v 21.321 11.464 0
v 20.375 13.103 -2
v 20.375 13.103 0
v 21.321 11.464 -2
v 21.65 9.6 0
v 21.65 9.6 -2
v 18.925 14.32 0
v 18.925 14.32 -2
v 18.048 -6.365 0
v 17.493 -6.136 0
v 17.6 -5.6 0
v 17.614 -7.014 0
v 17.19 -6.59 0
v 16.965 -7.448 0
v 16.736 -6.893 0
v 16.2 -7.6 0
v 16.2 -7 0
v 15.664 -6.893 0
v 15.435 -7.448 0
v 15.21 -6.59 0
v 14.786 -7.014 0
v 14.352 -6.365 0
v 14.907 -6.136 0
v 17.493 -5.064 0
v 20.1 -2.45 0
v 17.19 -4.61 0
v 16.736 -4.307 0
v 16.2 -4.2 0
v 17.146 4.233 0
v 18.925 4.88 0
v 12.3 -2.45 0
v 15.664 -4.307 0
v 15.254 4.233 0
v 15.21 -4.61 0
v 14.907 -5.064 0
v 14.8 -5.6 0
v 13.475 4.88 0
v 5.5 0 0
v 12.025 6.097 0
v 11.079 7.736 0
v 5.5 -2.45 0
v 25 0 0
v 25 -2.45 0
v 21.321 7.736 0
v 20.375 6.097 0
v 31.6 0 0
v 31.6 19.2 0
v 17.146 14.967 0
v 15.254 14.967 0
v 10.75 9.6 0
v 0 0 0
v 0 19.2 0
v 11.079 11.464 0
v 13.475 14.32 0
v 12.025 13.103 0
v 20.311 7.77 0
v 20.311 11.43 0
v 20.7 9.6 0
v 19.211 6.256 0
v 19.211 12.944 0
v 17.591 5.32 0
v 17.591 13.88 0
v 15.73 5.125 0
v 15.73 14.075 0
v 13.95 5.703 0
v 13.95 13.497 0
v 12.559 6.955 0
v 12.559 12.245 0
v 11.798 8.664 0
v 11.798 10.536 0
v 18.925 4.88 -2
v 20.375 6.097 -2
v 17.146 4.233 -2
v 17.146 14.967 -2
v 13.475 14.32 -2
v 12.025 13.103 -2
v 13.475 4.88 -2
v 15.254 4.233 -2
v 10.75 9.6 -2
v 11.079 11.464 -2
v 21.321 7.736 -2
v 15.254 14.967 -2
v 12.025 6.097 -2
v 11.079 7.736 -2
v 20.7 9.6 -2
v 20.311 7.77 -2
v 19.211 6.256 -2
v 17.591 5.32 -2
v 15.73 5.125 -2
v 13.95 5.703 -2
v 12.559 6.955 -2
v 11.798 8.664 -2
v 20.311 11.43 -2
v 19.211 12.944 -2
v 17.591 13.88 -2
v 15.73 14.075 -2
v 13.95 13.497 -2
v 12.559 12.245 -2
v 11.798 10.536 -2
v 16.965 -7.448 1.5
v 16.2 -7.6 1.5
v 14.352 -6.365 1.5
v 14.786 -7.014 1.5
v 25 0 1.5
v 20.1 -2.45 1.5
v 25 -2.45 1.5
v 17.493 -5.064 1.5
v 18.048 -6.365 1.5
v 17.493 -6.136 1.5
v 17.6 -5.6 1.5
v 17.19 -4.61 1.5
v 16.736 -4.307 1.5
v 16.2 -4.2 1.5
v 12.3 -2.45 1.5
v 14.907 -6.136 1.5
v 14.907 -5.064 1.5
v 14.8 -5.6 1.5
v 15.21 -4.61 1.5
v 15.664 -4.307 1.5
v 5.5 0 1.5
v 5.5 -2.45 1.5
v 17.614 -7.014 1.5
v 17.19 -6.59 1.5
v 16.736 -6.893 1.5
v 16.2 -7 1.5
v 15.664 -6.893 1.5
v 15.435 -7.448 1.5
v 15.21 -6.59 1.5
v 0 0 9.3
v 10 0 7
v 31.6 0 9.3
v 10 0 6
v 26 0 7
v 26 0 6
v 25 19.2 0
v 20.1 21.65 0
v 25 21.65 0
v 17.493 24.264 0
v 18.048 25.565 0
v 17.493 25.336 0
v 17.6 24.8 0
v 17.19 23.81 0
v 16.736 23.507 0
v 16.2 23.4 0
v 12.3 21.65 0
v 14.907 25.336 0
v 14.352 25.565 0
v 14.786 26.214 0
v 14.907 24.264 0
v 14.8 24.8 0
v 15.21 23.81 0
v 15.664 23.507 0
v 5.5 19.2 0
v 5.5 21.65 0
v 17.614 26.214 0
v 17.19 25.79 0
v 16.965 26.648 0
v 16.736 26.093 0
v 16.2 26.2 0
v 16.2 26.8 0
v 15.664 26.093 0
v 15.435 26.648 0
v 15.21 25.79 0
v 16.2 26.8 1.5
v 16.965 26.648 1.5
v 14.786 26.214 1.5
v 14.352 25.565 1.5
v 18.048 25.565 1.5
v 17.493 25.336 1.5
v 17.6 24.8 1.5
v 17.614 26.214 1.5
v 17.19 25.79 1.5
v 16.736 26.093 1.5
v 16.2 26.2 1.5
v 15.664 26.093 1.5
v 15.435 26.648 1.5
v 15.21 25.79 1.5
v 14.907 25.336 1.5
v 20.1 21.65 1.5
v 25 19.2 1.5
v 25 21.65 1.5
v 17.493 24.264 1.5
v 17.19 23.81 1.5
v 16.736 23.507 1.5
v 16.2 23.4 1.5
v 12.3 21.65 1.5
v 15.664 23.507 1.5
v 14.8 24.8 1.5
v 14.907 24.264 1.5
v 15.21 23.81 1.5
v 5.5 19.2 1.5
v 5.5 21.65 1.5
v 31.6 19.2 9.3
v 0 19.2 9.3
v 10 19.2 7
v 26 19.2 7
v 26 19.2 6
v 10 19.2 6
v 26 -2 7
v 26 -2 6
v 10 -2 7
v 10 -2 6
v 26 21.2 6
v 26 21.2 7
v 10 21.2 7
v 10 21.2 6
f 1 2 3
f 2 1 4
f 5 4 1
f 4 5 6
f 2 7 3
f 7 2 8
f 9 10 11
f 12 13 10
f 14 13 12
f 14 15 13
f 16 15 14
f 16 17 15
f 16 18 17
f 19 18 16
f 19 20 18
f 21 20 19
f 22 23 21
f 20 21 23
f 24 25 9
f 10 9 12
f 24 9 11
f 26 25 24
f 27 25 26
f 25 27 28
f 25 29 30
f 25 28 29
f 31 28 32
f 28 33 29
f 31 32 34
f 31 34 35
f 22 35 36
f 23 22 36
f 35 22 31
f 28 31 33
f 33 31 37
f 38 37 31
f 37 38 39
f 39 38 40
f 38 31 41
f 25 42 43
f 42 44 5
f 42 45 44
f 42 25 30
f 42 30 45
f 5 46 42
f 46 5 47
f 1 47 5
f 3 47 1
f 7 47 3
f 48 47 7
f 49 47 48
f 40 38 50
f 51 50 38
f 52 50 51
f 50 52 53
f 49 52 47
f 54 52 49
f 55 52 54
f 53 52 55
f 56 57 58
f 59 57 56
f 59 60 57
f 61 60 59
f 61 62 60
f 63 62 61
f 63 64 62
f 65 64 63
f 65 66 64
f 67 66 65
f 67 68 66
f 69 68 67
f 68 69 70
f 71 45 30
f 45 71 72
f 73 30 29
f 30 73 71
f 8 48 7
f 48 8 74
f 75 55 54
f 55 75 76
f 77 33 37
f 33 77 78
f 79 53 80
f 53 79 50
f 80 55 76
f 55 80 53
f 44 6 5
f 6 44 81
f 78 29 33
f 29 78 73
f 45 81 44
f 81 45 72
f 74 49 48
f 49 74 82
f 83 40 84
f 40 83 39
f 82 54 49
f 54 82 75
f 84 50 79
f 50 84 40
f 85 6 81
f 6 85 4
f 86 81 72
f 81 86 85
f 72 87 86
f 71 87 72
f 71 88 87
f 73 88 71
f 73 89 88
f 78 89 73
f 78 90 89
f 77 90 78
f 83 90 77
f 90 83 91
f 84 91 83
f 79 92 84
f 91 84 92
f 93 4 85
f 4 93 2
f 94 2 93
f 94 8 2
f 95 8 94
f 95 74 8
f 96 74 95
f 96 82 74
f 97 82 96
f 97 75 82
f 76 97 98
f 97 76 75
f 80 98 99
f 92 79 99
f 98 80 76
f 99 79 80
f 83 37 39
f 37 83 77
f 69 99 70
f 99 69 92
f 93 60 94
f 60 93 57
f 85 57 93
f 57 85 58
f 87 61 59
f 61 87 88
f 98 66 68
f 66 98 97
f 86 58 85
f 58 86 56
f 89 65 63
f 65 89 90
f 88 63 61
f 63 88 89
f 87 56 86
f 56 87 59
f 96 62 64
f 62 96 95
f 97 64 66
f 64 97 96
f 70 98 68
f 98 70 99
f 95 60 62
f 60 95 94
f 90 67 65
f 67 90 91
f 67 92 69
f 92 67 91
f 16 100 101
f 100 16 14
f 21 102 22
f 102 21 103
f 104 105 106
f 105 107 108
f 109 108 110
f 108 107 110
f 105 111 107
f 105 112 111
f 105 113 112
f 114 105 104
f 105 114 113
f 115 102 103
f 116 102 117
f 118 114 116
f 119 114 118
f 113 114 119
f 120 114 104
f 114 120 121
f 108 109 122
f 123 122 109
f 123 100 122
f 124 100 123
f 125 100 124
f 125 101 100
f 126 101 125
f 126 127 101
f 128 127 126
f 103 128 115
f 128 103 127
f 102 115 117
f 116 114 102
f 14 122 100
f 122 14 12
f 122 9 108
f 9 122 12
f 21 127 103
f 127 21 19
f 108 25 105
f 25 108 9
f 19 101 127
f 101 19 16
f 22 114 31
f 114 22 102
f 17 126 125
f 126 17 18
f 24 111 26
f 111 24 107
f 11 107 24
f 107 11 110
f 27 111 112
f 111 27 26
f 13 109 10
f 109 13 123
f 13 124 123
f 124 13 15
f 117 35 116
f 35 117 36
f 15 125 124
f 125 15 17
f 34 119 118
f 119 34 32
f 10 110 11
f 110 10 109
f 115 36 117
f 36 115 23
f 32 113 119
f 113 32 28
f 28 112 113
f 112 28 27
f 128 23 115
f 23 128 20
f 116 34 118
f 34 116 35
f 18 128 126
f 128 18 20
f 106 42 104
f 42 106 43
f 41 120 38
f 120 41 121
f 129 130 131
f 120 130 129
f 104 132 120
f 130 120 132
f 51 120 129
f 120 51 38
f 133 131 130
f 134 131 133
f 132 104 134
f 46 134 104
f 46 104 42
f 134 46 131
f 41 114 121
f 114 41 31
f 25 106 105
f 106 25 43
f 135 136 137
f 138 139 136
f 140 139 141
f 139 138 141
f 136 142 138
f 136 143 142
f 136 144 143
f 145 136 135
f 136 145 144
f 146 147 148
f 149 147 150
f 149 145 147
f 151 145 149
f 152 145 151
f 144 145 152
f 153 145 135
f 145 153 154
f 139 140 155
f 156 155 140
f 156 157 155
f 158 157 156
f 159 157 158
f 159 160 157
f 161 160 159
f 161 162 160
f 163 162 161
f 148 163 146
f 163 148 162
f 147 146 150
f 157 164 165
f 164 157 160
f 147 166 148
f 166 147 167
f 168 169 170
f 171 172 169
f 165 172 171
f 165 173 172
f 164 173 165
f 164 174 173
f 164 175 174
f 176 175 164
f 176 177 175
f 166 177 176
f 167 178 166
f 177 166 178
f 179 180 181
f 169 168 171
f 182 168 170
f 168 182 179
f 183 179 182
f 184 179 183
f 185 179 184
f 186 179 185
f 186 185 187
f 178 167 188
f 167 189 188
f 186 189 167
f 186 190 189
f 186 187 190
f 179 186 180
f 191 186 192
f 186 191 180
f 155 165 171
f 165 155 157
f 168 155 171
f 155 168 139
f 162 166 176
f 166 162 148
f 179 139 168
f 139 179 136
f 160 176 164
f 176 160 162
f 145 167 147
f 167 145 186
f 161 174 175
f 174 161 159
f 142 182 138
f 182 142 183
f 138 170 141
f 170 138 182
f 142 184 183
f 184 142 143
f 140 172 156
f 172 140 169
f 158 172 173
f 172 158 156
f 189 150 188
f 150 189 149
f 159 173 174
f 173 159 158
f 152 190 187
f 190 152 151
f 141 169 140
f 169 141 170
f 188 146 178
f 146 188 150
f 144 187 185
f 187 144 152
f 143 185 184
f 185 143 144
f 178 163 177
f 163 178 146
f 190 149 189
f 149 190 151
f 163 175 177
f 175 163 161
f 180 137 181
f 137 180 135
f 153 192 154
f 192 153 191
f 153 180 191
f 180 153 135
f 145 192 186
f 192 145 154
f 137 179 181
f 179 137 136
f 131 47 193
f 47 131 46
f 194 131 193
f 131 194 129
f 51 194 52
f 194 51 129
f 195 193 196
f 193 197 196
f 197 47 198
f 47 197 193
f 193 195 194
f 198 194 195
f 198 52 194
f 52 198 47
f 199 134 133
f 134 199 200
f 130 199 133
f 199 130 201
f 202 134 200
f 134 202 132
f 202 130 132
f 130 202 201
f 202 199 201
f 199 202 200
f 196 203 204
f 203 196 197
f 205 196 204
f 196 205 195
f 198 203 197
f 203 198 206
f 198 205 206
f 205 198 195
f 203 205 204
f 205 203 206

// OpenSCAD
// echo(version=version());
// Values are in millimeters

/* The outer most dimensions of the sensor */
function d2cs_h_dimensions() = [31.6, 33.5, 11.3];

module mount_wing() {
	translate([5.5, -2.45, 0]) {
		cube([19.5, 2.45, 1.5]); // TODO: Round corner a smige.
	}
	// This isn't centered on the wing-bit
	translate([16.2 - 7.8/2, -2.45, 0]) {
		difference() {
			hull() {
				cube([7.8, 0.1, 1.5]);
				translate([7.8/2, -3.15, 0]) cylinder(h=1.5, d=4, $fn=16);
			}
			translate([7.8/2, -3.15, -0.05]) cylinder(h=1.6, d=2.8, $fn=16);
		}
	}
}

/**
 * Capacitive Liquid Level Sensor
 * https://www.eptsensor.com/level-sensor/single-point-level-sensor/d2cs-h-capacitive-level-sensor.html
 */
module d2cs_h() {
	// The main cube (including the circle on the back)
	cube([ 31.6, 19.2, 9.3]);
	translate([16.2, 19.2/2, -2]) {
		difference($fn=35) {
			cylinder(h = 2, d=10.9);
			translate([0,0,-0.05]) cylinder(h = 2.1, d=9);
		}
	}

	// 'Wings' for mounting holes
	mount_wing();
	translate([0, 19.2, 0]) mirror([0,1,0]) mount_wing();
	
	// The rails above the wings
	translate([10, -2, 6]) {
		cube([16, 2, 1]);
	}
	translate([10, 19.2, 6]) {
		cube([16, 2, 1]);
	}
}

d2cs_h();
